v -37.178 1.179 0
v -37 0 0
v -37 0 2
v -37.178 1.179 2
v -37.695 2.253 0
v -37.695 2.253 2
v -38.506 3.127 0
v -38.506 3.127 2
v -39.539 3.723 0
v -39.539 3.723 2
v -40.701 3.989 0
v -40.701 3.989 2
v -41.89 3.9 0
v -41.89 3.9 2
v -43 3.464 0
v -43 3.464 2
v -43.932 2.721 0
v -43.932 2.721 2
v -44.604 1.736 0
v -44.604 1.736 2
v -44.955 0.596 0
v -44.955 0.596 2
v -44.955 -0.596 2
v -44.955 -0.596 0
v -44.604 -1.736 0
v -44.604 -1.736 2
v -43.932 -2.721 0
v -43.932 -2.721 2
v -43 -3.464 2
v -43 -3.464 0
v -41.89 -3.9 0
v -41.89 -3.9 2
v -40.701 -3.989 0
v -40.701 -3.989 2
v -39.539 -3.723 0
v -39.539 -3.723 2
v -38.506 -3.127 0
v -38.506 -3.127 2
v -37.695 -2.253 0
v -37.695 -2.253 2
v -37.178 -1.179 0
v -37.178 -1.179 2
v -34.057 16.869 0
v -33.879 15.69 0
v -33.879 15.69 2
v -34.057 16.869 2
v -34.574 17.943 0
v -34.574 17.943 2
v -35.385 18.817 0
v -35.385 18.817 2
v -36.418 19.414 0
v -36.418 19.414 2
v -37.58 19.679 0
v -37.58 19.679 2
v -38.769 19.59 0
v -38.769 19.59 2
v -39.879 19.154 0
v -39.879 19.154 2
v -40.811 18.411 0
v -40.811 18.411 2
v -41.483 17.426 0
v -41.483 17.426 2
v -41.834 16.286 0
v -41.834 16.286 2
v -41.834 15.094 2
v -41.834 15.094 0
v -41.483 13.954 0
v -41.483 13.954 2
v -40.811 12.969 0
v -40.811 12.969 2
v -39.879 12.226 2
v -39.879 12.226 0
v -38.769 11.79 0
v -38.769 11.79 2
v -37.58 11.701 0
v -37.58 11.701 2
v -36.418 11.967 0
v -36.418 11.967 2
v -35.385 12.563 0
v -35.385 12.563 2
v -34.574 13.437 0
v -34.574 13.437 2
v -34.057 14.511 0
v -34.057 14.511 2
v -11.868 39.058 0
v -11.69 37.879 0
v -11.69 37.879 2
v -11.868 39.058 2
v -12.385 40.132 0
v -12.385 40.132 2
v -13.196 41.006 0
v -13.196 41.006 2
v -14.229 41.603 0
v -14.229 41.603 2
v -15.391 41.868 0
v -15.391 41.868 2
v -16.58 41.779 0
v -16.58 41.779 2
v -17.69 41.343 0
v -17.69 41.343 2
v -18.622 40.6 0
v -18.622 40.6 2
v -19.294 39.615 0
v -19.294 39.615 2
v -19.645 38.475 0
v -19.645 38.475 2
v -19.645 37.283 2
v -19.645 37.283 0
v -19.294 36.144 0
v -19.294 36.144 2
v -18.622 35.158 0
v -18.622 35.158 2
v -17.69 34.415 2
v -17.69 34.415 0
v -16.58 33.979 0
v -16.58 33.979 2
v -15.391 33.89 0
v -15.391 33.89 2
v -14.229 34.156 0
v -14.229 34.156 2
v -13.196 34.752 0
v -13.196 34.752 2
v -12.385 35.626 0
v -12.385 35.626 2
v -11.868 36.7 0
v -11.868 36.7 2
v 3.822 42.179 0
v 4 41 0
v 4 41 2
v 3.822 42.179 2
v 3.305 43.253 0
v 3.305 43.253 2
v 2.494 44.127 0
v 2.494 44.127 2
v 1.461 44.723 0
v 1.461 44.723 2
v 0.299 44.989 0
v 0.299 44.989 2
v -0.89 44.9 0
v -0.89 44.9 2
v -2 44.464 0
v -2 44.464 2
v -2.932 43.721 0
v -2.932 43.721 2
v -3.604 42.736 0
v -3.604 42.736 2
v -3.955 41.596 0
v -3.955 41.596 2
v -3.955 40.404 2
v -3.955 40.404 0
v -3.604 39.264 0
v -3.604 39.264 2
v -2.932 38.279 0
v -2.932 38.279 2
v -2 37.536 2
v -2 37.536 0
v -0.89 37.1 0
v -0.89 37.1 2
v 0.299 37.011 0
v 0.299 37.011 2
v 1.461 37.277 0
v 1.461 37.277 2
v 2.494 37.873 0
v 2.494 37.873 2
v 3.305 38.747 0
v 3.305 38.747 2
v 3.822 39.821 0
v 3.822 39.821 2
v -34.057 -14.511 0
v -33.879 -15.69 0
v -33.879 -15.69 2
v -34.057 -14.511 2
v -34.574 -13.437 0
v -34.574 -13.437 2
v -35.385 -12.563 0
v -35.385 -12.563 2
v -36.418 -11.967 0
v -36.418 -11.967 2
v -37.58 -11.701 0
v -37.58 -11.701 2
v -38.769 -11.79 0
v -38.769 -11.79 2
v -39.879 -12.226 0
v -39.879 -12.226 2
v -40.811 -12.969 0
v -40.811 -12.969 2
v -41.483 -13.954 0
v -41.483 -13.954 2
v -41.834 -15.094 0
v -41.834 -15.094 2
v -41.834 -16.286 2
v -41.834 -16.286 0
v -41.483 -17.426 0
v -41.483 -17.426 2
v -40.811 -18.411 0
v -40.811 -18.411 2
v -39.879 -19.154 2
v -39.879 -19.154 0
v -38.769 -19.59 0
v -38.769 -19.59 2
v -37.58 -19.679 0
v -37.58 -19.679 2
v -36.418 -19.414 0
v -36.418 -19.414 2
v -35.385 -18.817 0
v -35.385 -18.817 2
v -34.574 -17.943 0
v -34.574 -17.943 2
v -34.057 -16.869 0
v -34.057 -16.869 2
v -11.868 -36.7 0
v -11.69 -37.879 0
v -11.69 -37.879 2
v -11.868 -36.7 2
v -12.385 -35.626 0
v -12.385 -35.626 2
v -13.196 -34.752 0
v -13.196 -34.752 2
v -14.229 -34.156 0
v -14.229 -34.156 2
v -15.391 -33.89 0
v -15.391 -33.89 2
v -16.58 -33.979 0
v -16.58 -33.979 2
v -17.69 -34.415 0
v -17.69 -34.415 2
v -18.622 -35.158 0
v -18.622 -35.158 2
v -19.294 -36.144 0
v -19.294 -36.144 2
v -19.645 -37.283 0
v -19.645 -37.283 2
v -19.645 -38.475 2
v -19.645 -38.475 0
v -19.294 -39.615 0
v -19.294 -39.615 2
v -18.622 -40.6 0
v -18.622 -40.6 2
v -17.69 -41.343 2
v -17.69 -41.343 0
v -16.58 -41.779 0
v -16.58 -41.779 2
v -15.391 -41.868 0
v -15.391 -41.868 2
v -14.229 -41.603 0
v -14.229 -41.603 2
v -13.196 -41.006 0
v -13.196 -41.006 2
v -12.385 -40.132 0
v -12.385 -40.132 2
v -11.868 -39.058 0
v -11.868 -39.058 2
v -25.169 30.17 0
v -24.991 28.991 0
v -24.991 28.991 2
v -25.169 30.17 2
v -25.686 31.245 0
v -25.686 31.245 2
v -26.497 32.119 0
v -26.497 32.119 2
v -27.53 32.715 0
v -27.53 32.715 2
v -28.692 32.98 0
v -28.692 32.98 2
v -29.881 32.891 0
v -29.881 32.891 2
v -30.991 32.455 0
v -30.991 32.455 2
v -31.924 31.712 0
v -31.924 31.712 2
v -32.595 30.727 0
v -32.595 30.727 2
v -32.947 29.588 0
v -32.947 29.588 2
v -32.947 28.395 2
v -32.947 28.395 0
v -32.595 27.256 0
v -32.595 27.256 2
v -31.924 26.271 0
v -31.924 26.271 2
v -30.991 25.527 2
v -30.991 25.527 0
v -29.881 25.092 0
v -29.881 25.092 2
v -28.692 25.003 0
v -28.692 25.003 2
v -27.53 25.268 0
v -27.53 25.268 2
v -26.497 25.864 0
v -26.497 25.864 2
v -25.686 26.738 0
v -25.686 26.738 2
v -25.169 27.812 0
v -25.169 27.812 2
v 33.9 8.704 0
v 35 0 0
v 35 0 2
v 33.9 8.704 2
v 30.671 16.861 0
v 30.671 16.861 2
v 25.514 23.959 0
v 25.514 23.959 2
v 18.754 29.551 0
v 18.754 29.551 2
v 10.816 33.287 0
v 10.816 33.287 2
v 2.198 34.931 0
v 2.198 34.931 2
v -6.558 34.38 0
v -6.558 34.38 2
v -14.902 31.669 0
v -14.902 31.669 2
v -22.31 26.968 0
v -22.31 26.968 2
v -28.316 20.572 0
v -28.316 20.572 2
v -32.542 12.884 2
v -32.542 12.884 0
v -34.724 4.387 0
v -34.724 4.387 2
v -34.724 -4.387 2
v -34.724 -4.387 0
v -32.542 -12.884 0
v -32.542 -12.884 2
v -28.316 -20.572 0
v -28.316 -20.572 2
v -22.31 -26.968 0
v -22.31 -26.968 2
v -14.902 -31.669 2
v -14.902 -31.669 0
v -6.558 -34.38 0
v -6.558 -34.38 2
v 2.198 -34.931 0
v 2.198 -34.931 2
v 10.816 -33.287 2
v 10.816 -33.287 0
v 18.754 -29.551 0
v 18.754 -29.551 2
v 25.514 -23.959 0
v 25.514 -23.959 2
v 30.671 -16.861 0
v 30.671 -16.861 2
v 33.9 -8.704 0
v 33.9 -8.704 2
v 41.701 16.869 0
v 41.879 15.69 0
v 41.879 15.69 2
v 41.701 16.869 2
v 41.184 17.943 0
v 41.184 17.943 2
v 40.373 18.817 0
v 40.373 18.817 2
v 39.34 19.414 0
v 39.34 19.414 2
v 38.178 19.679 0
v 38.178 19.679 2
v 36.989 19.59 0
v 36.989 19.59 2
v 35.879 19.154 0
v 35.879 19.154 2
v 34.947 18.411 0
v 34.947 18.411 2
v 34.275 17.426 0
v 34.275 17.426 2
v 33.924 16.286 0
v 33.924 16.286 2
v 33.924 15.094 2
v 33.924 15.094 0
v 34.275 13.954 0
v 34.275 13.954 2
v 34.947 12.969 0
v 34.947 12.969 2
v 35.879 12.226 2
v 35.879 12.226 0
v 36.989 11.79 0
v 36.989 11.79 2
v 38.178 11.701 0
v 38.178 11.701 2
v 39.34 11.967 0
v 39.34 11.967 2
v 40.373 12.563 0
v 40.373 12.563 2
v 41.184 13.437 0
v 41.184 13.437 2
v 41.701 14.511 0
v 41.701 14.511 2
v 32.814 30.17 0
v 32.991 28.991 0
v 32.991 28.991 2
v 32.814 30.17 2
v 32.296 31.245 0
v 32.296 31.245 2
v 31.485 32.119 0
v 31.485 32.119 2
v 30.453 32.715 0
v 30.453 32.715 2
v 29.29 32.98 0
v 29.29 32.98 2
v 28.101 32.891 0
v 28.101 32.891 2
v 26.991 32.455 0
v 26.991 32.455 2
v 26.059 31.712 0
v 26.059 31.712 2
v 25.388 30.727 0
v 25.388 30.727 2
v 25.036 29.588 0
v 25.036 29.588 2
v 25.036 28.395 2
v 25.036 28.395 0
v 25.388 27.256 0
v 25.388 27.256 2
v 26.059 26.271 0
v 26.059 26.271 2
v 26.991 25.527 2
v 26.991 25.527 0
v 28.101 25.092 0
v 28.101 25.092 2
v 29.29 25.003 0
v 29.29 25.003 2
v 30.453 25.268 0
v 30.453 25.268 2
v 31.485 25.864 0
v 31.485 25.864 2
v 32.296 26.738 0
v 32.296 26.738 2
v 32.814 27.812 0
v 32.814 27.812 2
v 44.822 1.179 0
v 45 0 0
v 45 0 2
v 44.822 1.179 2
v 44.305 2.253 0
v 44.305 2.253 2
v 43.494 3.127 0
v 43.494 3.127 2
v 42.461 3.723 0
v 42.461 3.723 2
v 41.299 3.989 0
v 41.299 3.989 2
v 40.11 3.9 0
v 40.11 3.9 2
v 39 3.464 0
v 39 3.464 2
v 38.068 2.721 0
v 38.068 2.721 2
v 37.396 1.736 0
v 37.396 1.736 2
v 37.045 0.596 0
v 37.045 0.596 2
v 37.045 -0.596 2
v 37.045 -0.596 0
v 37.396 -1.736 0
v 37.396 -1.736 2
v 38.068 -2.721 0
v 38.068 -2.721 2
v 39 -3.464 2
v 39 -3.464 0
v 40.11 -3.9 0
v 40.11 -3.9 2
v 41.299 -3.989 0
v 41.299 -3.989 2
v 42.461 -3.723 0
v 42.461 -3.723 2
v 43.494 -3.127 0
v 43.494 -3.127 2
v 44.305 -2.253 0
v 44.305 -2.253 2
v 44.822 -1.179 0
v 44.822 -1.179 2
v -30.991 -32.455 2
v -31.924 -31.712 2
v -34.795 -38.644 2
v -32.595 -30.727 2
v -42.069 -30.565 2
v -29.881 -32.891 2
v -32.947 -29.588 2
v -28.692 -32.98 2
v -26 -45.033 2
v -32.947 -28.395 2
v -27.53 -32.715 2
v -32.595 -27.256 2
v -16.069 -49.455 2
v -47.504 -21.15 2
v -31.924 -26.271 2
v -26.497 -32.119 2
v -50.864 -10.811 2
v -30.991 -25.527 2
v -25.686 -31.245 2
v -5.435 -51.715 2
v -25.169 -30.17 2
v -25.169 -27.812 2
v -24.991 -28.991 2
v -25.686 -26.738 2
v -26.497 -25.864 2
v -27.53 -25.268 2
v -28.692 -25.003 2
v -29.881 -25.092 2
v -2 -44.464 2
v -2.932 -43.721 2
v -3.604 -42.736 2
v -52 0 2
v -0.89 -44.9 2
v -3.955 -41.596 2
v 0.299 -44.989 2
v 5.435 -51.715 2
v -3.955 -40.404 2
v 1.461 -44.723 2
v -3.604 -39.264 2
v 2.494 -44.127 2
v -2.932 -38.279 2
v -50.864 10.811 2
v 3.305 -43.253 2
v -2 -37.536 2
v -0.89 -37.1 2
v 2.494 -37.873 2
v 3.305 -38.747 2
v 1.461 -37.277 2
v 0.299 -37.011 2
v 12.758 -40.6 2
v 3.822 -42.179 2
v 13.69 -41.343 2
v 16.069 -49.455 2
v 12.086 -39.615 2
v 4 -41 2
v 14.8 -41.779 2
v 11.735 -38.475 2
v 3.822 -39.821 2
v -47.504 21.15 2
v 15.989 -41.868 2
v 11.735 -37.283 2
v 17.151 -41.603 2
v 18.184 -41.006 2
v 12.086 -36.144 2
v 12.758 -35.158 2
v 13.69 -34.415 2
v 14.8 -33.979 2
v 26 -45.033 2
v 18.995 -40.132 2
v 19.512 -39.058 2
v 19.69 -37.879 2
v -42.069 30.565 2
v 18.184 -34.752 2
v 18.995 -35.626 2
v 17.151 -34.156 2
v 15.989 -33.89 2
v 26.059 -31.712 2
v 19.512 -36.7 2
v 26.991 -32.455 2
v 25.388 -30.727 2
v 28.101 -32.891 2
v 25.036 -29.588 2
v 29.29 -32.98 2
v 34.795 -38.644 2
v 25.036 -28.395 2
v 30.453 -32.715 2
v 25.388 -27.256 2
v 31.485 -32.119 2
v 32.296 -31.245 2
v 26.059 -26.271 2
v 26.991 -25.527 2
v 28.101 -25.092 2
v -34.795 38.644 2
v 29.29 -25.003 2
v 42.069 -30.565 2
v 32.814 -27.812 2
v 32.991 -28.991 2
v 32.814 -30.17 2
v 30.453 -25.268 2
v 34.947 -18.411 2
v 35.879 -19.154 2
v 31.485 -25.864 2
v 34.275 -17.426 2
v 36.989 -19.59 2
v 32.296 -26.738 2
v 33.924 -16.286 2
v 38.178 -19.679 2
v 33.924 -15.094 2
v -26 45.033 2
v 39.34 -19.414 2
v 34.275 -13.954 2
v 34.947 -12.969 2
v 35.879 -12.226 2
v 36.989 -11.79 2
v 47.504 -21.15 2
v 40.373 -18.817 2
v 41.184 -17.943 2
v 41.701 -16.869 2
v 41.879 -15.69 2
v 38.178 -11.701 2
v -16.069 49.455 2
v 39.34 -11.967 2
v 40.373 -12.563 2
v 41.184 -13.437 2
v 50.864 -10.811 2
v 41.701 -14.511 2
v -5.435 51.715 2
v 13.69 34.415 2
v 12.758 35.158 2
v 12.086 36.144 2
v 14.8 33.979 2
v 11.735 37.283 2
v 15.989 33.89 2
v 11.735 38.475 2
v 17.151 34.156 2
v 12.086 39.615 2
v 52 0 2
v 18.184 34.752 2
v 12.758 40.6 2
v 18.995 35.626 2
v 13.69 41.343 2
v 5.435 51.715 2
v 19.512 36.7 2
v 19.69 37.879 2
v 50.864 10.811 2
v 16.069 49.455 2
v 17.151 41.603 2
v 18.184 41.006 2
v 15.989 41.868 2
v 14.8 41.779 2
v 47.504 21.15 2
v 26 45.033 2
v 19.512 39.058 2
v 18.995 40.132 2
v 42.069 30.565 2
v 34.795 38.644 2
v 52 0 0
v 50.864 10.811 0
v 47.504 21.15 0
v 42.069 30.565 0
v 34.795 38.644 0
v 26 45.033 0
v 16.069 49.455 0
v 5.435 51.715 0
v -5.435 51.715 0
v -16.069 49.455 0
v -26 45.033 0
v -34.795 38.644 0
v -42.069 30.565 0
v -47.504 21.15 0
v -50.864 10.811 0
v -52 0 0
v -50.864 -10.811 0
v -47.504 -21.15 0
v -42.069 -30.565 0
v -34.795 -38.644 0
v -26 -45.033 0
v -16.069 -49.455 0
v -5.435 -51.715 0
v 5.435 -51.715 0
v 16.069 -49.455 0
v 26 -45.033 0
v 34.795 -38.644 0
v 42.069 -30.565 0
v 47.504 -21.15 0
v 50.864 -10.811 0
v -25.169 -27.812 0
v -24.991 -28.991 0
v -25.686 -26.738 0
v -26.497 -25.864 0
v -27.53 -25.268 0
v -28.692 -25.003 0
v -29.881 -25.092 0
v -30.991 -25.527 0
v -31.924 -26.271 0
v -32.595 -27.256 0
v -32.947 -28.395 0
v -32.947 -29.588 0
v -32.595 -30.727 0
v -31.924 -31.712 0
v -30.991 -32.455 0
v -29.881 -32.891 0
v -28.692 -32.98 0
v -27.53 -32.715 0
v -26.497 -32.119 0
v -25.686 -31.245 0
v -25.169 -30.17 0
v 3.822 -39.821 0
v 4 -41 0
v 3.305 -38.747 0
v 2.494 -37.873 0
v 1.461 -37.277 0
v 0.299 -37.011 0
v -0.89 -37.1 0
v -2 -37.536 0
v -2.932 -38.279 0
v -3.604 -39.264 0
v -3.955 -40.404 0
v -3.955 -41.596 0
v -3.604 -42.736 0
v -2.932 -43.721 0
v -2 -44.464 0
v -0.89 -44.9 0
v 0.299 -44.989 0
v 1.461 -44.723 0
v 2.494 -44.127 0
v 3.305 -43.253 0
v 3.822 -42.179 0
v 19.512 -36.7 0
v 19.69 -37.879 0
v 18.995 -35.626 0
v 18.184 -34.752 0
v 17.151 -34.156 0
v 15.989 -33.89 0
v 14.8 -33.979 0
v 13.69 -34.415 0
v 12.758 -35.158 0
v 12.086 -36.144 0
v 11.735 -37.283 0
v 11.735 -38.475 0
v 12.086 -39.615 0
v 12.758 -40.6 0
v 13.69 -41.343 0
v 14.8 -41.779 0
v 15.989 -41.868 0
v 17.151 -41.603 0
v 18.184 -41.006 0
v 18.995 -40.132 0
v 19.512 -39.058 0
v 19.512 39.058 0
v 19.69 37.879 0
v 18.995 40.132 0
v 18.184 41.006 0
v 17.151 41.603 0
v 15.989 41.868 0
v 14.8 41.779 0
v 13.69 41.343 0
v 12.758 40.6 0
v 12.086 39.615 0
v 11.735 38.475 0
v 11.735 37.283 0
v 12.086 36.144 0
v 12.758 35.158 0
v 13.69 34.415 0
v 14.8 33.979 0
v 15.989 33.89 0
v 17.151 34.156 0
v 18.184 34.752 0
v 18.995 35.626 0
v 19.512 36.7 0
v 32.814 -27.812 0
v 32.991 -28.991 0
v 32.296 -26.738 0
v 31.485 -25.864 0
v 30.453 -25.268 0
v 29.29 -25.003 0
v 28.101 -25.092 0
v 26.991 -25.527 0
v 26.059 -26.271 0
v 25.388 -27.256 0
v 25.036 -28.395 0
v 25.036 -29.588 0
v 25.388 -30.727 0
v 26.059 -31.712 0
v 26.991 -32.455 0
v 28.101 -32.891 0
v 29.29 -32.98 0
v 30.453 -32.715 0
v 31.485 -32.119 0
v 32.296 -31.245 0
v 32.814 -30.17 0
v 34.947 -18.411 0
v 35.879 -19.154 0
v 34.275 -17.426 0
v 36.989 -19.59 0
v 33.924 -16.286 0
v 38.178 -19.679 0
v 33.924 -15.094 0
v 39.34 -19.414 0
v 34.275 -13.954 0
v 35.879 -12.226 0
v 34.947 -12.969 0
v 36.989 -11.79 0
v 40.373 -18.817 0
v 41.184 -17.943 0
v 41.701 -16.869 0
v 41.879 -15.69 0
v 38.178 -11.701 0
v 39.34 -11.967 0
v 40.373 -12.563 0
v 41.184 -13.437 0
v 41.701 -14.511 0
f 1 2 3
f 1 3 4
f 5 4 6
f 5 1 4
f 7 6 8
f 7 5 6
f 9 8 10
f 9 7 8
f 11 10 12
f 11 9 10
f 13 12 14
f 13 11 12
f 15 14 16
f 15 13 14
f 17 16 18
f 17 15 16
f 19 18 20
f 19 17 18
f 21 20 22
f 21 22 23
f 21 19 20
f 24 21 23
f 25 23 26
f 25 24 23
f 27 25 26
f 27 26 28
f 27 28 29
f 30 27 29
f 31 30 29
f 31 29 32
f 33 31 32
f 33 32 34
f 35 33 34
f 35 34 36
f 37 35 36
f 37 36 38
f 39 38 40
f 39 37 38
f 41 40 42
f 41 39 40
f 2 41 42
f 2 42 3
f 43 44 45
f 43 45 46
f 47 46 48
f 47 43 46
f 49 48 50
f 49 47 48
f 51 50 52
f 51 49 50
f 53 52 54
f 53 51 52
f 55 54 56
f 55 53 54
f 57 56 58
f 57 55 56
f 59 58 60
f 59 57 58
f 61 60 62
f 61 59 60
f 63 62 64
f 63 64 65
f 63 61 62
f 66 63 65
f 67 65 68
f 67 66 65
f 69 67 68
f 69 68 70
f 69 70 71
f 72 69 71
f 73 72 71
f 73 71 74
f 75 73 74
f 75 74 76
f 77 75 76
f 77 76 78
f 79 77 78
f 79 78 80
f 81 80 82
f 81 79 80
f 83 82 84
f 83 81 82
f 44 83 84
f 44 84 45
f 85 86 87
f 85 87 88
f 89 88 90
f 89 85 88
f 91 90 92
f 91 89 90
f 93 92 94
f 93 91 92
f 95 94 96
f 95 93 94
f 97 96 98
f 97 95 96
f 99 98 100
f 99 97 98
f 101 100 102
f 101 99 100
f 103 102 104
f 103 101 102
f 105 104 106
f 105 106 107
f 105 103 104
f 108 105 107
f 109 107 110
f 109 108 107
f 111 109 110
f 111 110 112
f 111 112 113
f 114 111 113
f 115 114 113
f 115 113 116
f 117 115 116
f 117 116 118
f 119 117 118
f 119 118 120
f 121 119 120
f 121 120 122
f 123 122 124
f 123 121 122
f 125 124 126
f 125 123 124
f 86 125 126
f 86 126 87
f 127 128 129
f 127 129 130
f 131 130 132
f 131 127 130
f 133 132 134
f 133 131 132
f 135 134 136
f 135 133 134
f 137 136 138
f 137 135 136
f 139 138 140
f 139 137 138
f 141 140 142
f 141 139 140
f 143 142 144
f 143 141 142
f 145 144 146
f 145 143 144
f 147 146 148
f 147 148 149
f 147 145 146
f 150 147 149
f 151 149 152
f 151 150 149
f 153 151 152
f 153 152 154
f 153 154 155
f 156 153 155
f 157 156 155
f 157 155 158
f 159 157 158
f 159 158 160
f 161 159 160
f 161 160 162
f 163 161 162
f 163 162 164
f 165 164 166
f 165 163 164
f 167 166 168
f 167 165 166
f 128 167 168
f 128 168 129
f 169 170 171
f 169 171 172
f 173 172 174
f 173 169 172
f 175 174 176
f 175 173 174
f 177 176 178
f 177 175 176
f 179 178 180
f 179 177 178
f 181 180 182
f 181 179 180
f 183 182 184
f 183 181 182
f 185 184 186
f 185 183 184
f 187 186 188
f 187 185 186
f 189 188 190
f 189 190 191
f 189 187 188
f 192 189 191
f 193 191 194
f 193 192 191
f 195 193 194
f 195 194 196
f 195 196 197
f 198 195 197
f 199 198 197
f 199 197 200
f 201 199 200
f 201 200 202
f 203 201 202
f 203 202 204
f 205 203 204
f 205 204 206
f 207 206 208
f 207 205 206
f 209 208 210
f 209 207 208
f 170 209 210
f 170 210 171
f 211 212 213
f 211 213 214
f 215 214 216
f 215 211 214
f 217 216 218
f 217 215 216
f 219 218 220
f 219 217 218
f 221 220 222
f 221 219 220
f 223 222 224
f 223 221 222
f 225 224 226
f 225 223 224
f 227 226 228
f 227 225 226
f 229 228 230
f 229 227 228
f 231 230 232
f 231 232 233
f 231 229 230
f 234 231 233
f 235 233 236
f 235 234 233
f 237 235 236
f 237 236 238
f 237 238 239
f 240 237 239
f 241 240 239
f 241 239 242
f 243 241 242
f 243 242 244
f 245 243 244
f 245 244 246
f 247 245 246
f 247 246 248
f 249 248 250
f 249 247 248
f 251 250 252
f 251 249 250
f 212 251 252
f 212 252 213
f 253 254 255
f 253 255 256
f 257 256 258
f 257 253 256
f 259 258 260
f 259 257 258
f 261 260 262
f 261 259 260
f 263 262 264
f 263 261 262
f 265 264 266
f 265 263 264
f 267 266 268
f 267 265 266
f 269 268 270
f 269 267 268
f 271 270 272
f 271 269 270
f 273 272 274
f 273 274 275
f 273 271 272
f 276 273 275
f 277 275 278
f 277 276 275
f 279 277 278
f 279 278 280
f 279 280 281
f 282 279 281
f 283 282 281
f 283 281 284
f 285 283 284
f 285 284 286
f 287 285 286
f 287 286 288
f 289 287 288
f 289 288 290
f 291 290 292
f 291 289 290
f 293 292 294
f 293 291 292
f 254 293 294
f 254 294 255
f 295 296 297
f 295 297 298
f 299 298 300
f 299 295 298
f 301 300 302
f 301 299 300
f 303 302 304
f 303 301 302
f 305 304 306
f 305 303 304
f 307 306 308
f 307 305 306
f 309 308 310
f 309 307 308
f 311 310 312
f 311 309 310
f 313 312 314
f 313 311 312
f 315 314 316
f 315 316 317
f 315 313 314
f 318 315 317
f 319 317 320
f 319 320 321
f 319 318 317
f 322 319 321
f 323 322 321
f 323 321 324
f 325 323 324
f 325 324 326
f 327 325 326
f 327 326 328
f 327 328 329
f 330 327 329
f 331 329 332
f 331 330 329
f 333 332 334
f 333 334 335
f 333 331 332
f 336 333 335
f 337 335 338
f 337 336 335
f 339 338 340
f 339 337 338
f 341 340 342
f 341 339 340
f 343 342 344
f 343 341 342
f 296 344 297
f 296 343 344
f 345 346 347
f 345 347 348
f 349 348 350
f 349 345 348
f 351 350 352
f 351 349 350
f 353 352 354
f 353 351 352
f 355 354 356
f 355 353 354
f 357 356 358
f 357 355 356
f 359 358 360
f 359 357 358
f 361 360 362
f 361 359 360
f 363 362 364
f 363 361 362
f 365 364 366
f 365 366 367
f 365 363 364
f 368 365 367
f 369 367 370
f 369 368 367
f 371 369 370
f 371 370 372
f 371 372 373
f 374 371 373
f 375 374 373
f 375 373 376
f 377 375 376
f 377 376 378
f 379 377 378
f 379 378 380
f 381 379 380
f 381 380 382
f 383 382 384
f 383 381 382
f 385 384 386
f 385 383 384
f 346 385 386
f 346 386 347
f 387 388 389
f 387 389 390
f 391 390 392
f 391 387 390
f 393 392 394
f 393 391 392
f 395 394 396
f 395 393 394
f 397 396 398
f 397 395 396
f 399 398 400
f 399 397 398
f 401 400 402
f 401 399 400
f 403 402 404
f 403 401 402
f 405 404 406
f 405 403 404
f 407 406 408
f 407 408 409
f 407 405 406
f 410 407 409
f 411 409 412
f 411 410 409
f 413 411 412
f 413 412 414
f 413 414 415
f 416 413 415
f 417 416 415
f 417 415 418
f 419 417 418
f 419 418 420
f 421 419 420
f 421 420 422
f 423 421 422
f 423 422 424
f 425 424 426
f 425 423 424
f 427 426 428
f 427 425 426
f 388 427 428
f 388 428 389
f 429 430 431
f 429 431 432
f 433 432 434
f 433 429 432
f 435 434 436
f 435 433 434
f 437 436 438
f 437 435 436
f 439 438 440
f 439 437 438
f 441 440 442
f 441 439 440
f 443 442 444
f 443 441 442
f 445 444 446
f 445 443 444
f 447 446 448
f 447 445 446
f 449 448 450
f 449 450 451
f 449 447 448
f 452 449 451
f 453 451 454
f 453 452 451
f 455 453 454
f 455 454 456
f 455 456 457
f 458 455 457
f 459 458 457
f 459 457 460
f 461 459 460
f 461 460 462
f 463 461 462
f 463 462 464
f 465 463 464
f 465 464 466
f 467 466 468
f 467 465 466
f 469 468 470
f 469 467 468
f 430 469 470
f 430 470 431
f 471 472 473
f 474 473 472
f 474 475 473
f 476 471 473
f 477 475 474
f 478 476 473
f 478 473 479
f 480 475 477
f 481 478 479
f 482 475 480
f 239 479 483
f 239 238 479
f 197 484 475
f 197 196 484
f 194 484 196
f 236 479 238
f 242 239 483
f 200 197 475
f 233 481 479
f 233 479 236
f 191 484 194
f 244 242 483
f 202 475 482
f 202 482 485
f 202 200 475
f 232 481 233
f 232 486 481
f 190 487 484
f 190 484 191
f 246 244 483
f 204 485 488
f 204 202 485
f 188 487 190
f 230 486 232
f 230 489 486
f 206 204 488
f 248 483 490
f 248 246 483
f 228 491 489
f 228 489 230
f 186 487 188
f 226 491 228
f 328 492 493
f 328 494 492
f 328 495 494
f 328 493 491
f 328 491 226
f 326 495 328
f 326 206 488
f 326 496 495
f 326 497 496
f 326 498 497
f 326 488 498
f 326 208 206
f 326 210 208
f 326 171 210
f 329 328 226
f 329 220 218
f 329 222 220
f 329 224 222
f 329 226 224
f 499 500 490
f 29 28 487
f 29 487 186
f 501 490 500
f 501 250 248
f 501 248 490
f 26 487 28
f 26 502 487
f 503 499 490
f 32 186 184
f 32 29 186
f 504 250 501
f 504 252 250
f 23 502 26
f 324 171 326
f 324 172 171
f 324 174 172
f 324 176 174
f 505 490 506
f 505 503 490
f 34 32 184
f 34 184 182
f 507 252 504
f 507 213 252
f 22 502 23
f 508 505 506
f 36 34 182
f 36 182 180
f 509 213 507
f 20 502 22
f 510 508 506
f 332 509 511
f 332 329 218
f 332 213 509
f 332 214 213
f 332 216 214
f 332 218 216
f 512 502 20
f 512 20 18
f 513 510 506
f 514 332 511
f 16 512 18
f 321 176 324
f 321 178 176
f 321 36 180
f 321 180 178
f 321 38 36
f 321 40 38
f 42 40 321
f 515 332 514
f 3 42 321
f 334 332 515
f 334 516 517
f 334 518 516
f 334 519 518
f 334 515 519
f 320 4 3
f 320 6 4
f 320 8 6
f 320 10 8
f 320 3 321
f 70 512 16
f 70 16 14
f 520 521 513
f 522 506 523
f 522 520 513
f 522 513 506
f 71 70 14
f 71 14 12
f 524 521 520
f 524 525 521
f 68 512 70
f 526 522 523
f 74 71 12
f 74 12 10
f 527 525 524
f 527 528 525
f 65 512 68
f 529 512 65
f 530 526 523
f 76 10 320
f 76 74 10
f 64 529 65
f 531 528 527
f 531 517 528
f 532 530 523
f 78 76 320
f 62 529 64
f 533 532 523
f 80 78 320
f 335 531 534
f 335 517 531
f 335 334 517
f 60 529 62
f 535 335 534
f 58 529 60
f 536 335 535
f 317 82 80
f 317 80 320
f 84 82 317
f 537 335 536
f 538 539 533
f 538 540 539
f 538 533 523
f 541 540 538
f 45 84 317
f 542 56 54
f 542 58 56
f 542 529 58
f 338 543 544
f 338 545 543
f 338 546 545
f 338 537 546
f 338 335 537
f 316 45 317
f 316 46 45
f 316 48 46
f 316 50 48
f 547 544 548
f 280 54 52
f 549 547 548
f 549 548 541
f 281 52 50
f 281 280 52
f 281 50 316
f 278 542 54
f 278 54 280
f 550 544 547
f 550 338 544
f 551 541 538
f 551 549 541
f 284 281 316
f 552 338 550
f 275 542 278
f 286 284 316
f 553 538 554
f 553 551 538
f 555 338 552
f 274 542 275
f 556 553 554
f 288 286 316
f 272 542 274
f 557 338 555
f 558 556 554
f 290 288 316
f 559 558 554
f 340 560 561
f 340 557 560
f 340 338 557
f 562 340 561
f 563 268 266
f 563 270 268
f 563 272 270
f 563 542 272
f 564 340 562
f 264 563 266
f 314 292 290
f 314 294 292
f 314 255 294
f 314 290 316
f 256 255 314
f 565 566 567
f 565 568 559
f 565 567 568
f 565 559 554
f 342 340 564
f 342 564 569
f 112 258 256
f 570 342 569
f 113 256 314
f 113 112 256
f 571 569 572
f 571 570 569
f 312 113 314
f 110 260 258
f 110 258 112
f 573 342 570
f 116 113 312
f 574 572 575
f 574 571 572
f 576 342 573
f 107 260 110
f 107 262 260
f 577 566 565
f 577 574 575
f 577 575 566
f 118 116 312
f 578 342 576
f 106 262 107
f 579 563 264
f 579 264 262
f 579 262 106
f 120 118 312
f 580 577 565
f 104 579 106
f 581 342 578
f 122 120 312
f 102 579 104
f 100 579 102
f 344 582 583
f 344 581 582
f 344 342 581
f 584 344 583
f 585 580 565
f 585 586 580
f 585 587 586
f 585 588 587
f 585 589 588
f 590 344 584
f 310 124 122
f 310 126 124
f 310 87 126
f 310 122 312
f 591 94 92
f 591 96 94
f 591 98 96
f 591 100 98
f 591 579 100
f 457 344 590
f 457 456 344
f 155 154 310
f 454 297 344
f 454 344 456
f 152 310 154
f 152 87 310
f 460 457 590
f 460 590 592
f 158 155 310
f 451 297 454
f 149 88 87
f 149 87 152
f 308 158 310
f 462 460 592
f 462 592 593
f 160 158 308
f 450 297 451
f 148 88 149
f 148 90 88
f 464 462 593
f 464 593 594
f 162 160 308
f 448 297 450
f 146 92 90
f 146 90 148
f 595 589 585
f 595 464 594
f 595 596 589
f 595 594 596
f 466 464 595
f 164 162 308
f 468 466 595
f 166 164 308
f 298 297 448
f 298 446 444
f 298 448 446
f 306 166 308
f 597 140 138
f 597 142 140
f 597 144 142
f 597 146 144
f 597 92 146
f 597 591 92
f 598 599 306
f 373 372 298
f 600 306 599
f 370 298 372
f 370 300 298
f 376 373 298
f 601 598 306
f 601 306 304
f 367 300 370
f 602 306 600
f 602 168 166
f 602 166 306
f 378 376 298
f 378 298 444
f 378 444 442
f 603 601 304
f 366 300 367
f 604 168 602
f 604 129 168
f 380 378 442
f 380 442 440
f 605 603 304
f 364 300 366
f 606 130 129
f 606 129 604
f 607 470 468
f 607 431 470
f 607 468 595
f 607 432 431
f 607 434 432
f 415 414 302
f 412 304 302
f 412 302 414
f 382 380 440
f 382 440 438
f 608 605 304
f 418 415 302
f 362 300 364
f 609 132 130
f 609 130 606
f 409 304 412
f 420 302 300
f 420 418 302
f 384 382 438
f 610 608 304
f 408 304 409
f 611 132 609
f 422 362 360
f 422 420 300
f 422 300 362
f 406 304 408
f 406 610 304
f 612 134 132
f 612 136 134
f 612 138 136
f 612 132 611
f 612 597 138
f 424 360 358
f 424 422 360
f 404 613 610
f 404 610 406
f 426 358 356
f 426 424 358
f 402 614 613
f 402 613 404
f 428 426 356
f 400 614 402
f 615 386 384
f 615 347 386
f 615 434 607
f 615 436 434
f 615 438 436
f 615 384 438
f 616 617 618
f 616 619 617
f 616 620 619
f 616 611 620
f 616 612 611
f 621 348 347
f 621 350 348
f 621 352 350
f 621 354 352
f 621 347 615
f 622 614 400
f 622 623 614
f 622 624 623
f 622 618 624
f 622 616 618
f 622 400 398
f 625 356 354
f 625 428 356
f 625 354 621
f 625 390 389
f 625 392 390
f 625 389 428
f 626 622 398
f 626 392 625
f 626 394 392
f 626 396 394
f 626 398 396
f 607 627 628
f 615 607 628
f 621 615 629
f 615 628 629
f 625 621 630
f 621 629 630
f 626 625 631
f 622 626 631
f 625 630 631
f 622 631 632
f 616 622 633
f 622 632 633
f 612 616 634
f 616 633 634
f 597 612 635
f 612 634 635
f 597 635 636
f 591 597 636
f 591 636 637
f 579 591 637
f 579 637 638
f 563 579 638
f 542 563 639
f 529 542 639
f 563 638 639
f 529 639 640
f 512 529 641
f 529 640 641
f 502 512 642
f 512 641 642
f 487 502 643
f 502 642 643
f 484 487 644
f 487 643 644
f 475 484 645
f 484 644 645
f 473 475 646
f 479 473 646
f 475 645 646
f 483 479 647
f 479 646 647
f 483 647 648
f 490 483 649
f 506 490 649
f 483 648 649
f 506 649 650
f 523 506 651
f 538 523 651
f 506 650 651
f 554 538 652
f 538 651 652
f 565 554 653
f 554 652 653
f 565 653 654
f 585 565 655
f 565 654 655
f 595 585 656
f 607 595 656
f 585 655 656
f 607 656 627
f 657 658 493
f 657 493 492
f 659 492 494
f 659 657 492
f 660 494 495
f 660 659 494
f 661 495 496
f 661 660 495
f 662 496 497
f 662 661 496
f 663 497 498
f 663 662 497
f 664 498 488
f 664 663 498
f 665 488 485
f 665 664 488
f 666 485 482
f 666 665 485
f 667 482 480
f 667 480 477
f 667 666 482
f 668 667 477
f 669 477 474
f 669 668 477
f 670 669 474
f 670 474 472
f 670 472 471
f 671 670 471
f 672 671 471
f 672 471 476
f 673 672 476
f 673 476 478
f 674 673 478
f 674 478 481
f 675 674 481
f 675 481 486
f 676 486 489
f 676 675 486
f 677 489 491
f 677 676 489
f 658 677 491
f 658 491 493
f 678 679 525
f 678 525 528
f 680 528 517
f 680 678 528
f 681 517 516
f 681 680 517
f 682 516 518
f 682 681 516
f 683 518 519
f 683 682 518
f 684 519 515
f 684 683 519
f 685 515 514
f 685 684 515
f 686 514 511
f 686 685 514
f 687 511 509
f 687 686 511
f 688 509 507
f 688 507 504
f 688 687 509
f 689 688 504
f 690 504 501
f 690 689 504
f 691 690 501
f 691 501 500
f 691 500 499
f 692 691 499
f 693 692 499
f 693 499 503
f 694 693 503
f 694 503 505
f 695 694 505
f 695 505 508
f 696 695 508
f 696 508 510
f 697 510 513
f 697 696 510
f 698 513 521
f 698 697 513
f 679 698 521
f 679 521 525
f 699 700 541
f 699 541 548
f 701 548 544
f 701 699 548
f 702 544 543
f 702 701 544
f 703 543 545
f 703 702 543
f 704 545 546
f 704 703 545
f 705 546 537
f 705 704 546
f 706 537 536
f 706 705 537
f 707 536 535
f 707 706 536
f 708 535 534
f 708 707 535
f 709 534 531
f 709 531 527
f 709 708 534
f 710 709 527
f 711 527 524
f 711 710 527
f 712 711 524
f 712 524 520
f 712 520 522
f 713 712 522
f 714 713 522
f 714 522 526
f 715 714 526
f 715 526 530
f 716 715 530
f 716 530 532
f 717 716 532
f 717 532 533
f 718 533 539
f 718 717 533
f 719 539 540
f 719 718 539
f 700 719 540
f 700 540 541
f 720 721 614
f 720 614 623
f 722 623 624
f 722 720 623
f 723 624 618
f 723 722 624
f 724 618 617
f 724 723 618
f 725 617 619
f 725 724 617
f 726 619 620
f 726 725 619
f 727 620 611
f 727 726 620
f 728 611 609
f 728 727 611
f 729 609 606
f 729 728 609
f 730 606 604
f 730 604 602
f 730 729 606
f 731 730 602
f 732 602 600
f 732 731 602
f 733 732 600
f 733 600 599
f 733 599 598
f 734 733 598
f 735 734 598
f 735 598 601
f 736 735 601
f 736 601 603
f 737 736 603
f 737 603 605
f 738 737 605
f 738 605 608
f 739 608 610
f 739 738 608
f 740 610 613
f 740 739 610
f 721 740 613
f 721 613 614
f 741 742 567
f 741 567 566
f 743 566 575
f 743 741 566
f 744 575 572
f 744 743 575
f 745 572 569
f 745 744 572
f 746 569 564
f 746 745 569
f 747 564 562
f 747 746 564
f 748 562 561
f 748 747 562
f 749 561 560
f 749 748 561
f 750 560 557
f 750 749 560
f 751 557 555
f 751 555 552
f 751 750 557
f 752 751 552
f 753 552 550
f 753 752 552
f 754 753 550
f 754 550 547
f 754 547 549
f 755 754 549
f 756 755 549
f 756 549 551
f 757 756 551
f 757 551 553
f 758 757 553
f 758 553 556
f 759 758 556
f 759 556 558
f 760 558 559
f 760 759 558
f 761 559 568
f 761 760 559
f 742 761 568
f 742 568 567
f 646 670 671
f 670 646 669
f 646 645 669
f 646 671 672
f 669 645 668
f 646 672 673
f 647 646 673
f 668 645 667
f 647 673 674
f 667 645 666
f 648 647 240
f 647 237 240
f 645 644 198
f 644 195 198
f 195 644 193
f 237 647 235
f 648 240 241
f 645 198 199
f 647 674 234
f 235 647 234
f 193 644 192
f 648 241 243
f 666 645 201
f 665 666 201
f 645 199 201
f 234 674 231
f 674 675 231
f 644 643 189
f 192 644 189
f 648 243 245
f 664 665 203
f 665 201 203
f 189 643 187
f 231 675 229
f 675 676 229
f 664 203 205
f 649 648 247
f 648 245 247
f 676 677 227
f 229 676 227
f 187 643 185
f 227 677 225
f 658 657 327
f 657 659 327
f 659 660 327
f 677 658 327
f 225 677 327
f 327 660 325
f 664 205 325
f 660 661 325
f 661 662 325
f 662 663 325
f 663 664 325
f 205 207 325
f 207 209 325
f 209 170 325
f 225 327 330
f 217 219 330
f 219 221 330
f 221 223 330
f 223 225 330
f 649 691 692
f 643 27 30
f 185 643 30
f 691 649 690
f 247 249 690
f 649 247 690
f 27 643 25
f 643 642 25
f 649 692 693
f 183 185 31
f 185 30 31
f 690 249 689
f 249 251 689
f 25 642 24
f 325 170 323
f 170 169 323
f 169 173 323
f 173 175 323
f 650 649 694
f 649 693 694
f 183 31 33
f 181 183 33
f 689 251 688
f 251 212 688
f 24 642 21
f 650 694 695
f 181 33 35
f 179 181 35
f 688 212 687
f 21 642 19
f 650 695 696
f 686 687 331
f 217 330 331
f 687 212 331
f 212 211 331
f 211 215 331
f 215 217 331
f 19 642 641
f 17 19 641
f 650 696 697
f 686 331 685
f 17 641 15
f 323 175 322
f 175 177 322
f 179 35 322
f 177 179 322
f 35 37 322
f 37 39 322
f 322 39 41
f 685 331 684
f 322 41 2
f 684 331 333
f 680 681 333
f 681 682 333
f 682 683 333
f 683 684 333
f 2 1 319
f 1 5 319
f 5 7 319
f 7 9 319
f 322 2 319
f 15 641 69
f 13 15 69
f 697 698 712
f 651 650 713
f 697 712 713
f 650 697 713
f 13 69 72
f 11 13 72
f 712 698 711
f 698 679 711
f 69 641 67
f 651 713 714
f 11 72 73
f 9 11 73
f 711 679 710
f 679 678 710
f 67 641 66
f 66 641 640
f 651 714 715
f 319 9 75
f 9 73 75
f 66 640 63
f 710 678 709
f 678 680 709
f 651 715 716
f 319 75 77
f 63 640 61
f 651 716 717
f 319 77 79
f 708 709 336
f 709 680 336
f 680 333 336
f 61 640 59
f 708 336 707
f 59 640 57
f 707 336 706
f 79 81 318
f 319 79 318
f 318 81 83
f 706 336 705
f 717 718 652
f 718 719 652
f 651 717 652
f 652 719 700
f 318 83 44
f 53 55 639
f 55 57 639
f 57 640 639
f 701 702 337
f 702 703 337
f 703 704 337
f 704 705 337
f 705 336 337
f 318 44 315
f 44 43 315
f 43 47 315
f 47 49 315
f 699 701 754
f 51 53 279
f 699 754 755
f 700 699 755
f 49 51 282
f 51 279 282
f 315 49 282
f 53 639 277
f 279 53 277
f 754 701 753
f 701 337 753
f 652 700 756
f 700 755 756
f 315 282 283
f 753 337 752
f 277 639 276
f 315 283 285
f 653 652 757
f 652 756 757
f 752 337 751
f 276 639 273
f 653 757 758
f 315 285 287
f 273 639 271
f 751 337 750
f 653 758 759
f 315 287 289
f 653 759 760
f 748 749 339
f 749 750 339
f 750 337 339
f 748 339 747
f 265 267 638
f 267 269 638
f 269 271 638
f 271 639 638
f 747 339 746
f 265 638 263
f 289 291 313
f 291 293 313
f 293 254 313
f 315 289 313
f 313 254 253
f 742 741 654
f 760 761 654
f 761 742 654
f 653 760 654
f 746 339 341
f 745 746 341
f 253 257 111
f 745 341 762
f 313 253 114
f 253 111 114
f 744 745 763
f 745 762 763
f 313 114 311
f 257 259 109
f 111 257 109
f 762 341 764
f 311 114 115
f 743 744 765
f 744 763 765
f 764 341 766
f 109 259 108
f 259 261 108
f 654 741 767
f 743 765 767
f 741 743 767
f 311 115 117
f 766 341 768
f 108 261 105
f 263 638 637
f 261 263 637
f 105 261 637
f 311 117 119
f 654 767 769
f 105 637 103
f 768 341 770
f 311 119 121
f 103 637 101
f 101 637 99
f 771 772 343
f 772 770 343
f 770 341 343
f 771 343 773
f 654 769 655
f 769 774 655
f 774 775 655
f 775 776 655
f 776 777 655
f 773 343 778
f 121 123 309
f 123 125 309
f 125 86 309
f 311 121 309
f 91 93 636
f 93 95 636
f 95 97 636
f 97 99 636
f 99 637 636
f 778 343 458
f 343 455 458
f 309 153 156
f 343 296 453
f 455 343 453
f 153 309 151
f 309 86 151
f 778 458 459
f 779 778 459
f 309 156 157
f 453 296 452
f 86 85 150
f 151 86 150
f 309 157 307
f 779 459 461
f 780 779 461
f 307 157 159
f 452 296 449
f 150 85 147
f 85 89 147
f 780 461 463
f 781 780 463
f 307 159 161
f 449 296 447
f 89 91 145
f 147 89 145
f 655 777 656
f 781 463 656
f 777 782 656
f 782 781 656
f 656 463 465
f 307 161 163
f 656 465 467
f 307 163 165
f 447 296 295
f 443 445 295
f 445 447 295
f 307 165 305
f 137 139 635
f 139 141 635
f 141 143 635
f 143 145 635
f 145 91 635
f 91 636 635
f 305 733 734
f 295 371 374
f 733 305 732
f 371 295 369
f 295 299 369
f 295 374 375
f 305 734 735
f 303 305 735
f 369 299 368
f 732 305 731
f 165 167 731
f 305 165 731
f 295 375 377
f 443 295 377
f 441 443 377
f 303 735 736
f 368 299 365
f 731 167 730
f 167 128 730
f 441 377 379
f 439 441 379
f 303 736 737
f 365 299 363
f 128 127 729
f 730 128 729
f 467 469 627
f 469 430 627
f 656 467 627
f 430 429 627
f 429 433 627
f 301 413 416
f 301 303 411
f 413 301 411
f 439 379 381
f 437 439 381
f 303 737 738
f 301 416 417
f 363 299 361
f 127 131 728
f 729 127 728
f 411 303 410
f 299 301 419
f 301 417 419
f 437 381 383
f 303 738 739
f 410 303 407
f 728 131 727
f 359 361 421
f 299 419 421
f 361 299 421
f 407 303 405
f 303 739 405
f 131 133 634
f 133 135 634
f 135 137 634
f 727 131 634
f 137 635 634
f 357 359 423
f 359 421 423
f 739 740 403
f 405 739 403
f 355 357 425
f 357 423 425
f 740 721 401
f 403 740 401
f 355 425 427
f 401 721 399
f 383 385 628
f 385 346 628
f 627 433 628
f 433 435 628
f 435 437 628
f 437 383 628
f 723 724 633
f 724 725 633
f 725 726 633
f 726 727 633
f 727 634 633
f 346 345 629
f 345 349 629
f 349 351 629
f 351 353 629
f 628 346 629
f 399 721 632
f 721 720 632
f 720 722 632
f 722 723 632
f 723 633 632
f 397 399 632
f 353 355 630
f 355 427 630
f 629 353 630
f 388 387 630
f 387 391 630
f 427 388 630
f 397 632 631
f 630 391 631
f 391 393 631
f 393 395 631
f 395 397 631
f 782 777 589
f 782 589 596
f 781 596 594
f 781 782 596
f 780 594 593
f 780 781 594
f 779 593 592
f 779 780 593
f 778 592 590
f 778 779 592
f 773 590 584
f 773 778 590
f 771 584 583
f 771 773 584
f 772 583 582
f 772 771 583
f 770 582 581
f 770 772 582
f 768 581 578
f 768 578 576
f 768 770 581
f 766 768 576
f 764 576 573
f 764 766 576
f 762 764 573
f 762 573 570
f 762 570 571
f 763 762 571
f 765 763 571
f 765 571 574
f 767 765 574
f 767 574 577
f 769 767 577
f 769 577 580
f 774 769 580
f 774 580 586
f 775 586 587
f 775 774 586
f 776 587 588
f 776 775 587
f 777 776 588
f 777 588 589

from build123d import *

# Parameters (mm, degrees)
F0_R     = 52
F0_R_2   = 4
F0_R_3   = 35
F1_DEPTH = 2
F2_DEPTH = 2


with BuildPart() as f1:
    # F0 (on Top) → F1 (new body)
    with BuildSketch(Plane.XY):
        Circle(F0_R)
        with Locations((-28.9913780286, -28.9913780286)):
            Circle(F0_R_2, mode=Mode.SUBTRACT)
        with Locations((-15.690020727, -37.879060833)):
            Circle(F0_R_2, mode=Mode.SUBTRACT)
        with Locations((-37.879060833, -15.690020727)):
            Circle(F0_R_2, mode=Mode.SUBTRACT)
        with Locations((0, -41)):
            Circle(F0_R_2, mode=Mode.SUBTRACT)
        with Locations((15.690020727, -37.879060833)):
            Circle(F0_R_2, mode=Mode.SUBTRACT)
        with Locations((28.9913780286, -28.9913780286)):
            Circle(F0_R_2, mode=Mode.SUBTRACT)
        with Locations((37.879060833, -15.690020727)):
            Circle(F0_R_2, mode=Mode.SUBTRACT)
        with Locations((-41, 0)):
            Circle(F0_R_2, mode=Mode.SUBTRACT)
        with Locations((-37.879060833, 15.690020727)):
            Circle(F0_R_2, mode=Mode.SUBTRACT)
        with Locations((-28.9913780286, 28.9913780286)):
            Circle(F0_R_2, mode=Mode.SUBTRACT)
        with Locations((-15.690020727, 37.879060833)):
            Circle(F0_R_2, mode=Mode.SUBTRACT)
        Circle(F0_R_3, mode=Mode.SUBTRACT)
        with Locations((41, 0)):
            Circle(F0_R_2, mode=Mode.SUBTRACT)
        with Locations((37.879060833, 15.690020727)):
            Circle(F0_R_2, mode=Mode.SUBTRACT)
        with Locations((15.690020727, 37.879060833)):
            Circle(F0_R_2, mode=Mode.SUBTRACT)
        with Locations((0, 41)):
            Circle(F0_R_2, mode=Mode.SUBTRACT)
        with Locations((28.9913780286, 28.9913780286)):
            Circle(F0_R_2, mode=Mode.SUBTRACT)
    extrude(amount=F1_DEPTH)

    # F0 (on Top) → F2 (join)
    with BuildSketch(Plane.XY):
        Circle(F0_R)
        with Locations((-28.9913780286, -28.9913780286)):
            Circle(F0_R_2, mode=Mode.SUBTRACT)
        with Locations((-15.690020727, -37.879060833)):
            Circle(F0_R_2, mode=Mode.SUBTRACT)
        with Locations((-37.879060833, -15.690020727)):
            Circle(F0_R_2, mode=Mode.SUBTRACT)
        with Locations((0, -41)):
            Circle(F0_R_2, mode=Mode.SUBTRACT)
        with Locations((15.690020727, -37.879060833)):
            Circle(F0_R_2, mode=Mode.SUBTRACT)
        with Locations((28.9913780286, -28.9913780286)):
            Circle(F0_R_2, mode=Mode.SUBTRACT)
        with Locations((37.879060833, -15.690020727)):
            Circle(F0_R_2, mode=Mode.SUBTRACT)
        with Locations((-41, 0)):
            Circle(F0_R_2, mode=Mode.SUBTRACT)
        with Locations((-37.879060833, 15.690020727)):
            Circle(F0_R_2, mode=Mode.SUBTRACT)
        with Locations((-28.9913780286, 28.9913780286)):
            Circle(F0_R_2, mode=Mode.SUBTRACT)
        with Locations((-15.690020727, 37.879060833)):
            Circle(F0_R_2, mode=Mode.SUBTRACT)
        Circle(F0_R_3, mode=Mode.SUBTRACT)
        with Locations((41, 0)):
            Circle(F0_R_2, mode=Mode.SUBTRACT)
        with Locations((37.879060833, 15.690020727)):
            Circle(F0_R_2, mode=Mode.SUBTRACT)
        with Locations((15.690020727, 37.879060833)):
            Circle(F0_R_2, mode=Mode.SUBTRACT)
        with Locations((0, 41)):
            Circle(F0_R_2, mode=Mode.SUBTRACT)
        with Locations((28.9913780286, 28.9913780286)):
            Circle(F0_R_2, mode=Mode.SUBTRACT)
    extrude(amount=F2_DEPTH)


solid = f1.part
